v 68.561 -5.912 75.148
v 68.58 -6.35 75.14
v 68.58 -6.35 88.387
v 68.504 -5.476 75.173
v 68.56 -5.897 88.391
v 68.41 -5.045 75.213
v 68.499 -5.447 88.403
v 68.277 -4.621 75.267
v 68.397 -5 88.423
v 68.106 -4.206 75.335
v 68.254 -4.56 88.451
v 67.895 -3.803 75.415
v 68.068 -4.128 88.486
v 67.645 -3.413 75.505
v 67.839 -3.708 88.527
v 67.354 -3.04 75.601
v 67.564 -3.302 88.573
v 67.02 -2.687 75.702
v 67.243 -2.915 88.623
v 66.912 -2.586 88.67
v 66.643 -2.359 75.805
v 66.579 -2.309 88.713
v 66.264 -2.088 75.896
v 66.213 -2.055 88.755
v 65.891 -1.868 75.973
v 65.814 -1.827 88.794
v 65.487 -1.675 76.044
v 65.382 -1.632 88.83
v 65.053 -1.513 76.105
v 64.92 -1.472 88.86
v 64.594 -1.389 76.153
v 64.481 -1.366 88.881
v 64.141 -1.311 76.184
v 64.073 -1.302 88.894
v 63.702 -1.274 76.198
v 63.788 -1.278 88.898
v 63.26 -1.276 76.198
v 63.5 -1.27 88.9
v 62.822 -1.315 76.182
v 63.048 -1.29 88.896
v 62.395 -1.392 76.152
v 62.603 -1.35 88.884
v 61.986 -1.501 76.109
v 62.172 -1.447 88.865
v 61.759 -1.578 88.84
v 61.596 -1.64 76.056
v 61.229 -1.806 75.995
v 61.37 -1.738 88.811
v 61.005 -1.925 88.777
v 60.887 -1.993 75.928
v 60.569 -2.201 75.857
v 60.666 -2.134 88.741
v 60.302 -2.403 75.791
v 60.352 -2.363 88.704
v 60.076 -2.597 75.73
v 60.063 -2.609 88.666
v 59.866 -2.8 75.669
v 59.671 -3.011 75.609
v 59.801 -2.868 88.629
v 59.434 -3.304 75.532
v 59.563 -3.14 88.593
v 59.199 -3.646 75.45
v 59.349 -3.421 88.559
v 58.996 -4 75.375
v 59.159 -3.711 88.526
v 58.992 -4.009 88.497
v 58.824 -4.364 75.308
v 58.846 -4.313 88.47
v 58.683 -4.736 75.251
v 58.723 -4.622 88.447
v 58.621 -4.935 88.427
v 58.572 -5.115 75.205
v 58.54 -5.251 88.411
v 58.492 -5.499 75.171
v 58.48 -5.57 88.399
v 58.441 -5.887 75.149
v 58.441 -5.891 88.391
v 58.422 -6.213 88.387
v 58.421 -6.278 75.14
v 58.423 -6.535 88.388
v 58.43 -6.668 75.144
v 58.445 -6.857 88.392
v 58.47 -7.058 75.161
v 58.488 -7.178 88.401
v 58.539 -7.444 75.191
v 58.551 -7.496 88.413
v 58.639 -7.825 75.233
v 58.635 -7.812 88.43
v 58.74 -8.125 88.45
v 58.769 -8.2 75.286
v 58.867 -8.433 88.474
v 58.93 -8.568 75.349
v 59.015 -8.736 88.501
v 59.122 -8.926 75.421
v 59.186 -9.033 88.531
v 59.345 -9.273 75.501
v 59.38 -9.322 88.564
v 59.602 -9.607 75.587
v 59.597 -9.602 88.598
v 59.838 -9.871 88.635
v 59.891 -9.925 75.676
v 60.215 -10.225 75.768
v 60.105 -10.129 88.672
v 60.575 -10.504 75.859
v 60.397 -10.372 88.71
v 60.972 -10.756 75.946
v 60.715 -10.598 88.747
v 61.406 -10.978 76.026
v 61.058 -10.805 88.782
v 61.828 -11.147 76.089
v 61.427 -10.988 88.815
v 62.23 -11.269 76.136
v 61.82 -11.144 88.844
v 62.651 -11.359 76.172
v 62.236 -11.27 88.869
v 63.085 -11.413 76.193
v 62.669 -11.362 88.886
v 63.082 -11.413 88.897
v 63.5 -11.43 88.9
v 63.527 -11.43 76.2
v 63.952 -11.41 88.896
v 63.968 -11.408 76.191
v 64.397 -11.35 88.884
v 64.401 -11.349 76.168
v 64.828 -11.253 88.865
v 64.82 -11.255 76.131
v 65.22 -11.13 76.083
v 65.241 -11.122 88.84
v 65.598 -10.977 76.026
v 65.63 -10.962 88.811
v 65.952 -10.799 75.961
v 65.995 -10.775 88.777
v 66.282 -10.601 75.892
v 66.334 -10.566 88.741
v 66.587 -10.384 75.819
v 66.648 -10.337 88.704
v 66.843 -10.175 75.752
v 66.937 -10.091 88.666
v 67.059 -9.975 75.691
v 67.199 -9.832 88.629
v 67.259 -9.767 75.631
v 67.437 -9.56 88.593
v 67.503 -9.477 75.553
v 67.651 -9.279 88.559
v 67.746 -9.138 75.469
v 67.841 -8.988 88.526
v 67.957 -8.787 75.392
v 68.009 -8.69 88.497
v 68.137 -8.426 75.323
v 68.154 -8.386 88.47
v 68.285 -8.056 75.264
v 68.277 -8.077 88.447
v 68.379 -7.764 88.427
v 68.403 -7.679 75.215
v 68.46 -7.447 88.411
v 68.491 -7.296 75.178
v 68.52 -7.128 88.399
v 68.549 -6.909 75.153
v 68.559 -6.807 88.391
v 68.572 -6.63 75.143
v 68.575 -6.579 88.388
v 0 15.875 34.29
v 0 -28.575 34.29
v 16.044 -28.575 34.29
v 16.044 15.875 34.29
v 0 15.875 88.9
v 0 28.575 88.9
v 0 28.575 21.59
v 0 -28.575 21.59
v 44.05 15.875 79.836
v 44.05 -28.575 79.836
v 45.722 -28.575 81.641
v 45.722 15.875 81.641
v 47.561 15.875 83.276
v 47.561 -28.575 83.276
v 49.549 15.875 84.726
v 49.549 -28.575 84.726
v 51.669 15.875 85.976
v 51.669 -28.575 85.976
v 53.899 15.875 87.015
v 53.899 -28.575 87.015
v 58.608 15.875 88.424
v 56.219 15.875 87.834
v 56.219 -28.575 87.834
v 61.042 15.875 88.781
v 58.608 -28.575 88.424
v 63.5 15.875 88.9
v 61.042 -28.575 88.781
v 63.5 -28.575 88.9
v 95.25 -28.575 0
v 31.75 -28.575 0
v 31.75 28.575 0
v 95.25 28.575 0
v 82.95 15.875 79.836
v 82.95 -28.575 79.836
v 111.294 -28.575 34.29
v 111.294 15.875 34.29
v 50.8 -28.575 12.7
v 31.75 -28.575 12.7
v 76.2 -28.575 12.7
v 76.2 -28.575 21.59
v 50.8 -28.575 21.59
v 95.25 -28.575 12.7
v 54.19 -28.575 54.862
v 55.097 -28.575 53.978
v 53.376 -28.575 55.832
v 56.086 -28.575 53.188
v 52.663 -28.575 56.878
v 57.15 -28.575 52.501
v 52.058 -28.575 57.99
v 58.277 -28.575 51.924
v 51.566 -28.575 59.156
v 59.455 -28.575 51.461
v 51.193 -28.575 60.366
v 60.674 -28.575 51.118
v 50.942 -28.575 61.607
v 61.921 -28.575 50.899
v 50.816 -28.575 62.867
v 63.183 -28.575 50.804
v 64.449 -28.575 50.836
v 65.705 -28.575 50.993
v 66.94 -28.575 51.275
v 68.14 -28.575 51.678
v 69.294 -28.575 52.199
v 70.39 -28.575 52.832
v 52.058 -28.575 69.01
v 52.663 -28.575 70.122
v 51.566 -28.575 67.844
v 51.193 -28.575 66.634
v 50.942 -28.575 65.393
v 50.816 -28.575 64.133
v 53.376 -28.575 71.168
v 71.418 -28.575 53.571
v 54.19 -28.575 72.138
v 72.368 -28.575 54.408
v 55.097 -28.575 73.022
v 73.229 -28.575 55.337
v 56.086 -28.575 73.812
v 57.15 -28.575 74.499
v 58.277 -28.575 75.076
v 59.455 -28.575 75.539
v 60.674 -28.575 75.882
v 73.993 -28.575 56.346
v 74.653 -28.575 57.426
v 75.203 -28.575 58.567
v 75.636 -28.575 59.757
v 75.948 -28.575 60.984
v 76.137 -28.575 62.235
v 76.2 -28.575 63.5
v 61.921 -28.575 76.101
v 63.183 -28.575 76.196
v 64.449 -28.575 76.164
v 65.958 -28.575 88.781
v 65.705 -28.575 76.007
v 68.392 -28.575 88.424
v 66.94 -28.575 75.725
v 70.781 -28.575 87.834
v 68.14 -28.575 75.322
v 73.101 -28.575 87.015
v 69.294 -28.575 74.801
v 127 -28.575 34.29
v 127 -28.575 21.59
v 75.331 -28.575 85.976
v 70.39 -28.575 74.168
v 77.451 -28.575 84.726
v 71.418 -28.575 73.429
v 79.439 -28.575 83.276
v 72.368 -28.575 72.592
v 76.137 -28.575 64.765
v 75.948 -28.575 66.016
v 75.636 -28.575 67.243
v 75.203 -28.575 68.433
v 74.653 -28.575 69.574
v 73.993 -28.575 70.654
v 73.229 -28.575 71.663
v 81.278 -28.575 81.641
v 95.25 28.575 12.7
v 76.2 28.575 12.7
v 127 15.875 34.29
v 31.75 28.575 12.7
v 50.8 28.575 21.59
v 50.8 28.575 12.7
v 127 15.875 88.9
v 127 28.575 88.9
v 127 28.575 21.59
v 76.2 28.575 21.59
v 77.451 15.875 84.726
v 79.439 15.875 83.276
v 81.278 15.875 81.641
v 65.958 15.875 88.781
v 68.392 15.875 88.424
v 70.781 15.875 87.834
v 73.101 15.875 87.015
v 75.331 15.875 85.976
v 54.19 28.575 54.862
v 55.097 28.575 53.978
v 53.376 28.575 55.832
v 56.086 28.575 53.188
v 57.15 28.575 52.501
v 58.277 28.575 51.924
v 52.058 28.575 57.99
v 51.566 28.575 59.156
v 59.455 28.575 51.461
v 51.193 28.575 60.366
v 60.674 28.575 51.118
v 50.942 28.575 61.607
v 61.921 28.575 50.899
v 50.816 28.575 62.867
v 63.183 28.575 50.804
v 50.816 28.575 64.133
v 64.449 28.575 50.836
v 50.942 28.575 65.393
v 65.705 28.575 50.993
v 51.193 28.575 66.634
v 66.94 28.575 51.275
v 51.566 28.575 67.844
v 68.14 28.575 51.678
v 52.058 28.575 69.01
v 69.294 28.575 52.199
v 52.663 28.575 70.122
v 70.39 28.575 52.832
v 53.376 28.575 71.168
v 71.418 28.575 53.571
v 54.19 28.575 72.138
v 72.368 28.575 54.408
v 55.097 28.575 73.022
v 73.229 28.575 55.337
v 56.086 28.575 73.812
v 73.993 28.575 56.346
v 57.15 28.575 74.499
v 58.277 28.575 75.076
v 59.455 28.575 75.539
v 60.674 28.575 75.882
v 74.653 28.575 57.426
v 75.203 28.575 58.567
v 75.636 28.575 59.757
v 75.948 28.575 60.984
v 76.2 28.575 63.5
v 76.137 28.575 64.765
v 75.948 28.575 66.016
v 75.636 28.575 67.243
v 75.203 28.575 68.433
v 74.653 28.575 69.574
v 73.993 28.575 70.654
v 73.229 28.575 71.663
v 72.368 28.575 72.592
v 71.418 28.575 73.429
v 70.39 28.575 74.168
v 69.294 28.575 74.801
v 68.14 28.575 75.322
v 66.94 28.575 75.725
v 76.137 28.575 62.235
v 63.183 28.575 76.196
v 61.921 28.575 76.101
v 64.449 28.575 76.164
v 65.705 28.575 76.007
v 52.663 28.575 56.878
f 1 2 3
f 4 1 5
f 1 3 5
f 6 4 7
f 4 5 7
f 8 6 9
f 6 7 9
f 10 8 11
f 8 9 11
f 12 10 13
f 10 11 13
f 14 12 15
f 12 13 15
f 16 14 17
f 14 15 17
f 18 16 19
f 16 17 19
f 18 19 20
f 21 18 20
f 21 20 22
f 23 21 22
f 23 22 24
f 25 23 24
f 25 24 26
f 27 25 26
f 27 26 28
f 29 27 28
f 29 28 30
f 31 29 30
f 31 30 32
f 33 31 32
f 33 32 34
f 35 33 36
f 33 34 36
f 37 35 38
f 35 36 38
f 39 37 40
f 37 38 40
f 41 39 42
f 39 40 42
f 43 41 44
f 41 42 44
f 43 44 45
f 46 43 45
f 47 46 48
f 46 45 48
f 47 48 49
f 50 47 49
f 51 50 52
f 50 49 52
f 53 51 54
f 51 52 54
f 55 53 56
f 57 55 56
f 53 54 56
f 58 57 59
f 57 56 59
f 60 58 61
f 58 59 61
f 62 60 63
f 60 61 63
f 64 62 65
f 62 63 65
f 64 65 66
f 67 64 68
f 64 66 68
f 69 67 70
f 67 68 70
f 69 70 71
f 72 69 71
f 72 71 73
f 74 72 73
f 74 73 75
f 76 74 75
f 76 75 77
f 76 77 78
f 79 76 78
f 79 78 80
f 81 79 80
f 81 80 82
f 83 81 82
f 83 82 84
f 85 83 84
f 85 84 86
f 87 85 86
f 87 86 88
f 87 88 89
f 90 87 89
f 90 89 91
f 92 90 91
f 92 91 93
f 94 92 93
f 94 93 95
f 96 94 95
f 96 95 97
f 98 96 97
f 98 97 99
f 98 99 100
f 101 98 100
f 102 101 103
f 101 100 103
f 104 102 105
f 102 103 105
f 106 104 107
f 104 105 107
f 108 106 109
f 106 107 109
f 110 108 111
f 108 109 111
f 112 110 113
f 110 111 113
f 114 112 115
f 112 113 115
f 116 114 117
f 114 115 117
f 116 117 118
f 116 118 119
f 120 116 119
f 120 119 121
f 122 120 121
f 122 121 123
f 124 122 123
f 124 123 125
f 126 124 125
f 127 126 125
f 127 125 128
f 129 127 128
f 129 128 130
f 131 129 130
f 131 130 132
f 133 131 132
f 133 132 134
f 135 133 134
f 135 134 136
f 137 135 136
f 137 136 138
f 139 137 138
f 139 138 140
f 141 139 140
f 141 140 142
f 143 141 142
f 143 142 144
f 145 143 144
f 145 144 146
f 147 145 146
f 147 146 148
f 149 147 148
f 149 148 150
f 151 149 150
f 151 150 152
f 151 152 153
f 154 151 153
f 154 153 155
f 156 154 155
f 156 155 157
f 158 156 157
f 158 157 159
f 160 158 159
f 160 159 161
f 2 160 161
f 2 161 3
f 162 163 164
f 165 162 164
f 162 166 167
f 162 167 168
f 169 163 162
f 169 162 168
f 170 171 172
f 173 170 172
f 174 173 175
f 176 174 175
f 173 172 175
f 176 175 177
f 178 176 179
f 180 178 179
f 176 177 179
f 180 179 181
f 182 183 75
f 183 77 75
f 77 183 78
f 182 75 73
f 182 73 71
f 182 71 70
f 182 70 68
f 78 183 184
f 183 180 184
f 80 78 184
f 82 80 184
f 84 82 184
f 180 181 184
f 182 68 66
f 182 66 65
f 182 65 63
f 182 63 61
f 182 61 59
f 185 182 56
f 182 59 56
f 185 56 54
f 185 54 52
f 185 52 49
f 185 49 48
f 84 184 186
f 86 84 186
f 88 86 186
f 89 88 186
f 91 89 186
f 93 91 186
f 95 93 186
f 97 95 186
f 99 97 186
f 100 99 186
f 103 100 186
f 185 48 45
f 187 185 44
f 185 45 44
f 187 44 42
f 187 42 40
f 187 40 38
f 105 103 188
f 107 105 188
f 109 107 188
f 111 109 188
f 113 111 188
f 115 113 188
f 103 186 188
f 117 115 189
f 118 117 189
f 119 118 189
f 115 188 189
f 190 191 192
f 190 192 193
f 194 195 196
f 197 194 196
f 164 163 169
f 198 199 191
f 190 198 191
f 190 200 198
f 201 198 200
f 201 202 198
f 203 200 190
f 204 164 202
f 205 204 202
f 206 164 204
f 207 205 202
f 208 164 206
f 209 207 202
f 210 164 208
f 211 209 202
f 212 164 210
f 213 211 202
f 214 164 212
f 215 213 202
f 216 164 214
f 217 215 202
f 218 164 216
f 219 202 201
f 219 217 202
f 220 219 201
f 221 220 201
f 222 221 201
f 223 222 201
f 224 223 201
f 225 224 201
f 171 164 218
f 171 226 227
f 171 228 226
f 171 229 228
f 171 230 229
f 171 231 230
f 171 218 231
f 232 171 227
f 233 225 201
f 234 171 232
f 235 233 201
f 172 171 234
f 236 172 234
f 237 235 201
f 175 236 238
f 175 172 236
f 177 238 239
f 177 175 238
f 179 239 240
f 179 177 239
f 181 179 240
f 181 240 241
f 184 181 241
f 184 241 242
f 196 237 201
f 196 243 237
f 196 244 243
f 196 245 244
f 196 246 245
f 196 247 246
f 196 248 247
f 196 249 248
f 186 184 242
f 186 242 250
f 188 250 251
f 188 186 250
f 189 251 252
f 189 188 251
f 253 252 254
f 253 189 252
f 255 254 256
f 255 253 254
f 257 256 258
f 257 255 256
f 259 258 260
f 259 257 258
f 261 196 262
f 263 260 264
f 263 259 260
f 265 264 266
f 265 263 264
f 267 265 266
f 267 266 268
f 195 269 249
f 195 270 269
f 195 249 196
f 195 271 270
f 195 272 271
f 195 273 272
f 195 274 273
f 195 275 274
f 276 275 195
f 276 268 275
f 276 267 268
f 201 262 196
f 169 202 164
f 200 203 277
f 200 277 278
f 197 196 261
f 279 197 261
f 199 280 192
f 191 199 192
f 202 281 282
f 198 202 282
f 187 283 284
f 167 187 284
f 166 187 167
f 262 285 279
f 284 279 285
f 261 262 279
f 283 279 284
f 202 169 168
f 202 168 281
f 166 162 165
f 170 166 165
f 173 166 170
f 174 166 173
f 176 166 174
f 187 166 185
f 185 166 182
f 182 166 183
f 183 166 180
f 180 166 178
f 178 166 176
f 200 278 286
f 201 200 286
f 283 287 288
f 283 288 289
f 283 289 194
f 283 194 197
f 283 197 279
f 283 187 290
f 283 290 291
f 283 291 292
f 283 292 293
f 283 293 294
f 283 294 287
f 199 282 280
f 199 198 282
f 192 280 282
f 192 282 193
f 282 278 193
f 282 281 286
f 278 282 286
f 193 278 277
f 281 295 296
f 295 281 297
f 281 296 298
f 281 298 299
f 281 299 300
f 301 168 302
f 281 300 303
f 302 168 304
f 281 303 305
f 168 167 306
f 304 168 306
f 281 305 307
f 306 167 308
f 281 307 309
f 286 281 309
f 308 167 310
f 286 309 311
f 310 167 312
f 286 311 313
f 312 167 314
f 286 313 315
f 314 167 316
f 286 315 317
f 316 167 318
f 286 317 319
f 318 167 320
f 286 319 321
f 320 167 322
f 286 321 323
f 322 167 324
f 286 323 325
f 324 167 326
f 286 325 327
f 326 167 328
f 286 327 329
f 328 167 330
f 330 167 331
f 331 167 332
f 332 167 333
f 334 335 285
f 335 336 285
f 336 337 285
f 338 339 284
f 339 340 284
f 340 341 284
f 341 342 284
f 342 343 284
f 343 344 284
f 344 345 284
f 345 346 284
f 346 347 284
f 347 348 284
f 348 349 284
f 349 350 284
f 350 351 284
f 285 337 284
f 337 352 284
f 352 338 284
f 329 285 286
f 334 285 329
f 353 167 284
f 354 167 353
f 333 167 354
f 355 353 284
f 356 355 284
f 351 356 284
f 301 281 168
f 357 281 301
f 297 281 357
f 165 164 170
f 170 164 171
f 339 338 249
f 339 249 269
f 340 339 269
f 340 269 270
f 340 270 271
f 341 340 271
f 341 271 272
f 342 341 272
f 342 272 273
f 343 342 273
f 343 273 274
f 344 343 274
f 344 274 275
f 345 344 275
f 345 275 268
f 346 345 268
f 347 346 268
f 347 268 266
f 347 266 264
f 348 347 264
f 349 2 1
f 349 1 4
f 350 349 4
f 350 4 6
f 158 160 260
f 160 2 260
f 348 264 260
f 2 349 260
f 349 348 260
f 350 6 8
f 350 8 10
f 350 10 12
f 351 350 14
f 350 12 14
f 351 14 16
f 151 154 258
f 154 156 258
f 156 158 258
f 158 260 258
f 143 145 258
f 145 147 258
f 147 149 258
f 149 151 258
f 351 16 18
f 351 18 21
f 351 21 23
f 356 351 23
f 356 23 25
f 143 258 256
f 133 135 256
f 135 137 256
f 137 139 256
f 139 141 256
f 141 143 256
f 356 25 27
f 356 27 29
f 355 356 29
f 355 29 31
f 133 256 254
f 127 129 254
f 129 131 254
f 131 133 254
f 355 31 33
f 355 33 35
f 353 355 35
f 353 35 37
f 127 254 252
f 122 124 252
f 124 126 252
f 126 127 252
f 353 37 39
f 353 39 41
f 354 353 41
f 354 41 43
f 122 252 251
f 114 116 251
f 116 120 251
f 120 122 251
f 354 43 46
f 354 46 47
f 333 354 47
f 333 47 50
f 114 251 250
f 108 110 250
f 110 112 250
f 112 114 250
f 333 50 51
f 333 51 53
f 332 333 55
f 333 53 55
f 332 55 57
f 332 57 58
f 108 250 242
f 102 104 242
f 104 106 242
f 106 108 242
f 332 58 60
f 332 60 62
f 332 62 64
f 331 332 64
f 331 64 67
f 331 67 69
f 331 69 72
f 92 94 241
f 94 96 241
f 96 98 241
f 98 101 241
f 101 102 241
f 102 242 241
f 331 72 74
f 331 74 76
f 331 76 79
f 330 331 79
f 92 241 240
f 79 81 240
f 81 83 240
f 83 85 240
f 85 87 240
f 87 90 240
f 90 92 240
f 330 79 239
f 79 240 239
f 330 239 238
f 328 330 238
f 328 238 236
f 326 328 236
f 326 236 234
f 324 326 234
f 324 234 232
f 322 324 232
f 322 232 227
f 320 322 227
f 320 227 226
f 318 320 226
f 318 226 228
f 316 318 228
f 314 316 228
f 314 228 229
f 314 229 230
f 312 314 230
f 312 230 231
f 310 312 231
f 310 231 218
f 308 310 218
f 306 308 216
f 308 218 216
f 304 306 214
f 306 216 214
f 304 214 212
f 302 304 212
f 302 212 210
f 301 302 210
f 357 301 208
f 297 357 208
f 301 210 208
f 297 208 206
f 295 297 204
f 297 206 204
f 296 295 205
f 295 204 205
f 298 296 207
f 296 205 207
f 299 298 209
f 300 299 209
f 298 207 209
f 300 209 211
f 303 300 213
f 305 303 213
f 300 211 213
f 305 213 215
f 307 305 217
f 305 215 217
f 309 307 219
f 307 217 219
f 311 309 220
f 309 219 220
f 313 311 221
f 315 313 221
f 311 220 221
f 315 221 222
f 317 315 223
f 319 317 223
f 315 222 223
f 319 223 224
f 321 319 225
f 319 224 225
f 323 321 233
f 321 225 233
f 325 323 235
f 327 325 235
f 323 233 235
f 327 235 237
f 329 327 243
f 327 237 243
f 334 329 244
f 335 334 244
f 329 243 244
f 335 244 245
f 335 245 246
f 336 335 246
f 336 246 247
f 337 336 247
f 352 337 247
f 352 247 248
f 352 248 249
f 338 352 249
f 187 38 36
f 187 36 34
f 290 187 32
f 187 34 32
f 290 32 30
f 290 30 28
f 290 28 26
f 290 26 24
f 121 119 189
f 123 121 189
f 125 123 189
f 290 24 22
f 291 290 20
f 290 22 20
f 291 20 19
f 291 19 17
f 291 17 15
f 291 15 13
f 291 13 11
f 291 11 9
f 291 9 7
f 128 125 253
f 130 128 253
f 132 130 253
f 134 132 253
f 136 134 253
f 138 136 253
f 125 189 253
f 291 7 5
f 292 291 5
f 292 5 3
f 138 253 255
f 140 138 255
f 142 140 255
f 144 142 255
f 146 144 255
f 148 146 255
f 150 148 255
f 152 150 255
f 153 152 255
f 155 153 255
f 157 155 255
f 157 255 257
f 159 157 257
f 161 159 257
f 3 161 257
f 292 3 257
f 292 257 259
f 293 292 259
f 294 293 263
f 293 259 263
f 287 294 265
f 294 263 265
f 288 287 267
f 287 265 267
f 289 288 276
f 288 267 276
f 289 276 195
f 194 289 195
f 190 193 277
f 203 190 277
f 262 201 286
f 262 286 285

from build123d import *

# Parameters (mm, degrees)
F1_DEPTH = 28.575
F3_DEPTH = 44.45
F4_R     = 12.7
F5_DEPTH = 57.15
F6_R     = 5.08
F7_DEPTH = 25.4


with BuildPart() as f1:
    # F0 (on Front) → F1 (new body, symmetric)
    with BuildSketch(Plane.XZ):
        Polygon((31.75, 12.7), (31.75, 0), (95.25, 0), (95.25, 12.7), (76.2, 12.7), (76.2, 21.59), (127, 21.59), (127, 88.9), (0, 88.9), (0, 21.59), (50.8, 21.59), (50.8, 12.7), align=None)
    extrude(amount=F1_DEPTH, both=True)

    # F2 (on face) → F3 (cut)
    with BuildSketch(Plane.XZ.offset(28.575)):
        with BuildLine():
            Line((0, 88.9), (0, 34.29))
            Line((0, 34.29), (16.044335, 34.29))
            Line((16.044335, 34.29), (44.050399, 79.836248))
            ThreePointArc((44.050399, 79.836248), (52.771084, 86.522822), (63.5, 88.9))
            Line((63.5, 88.9), (0, 88.9))
        make_face()
        with BuildLine():
            Line((127, 88.9), (63.5, 88.9))
            ThreePointArc((63.5, 88.9), (74.228916, 86.522822), (82.949601, 79.836248))
            Line((82.949601, 79.836248), (111.294335, 34.29))
            Line((111.294335, 34.29), (127, 34.29))
            Line((127, 34.29), (127, 88.9))
        make_face()
    extrude(amount=-F3_DEPTH, mode=Mode.SUBTRACT)

    # F4 (on face) → F5 (cut)
    with BuildSketch(Plane.XZ.offset(28.575)):
        with Locations((63.5, 63.5)):
            Circle(F4_R)
    extrude(amount=-F5_DEPTH, mode=Mode.SUBTRACT)

    # F6 (on face) → F7 (cut)
    with BuildSketch(Plane.XY.offset(88.9)):
        with Locations((63.5, -6.35)):
            Circle(F6_R)
    extrude(amount=-F7_DEPTH, mode=Mode.SUBTRACT)


solid = f1.part
